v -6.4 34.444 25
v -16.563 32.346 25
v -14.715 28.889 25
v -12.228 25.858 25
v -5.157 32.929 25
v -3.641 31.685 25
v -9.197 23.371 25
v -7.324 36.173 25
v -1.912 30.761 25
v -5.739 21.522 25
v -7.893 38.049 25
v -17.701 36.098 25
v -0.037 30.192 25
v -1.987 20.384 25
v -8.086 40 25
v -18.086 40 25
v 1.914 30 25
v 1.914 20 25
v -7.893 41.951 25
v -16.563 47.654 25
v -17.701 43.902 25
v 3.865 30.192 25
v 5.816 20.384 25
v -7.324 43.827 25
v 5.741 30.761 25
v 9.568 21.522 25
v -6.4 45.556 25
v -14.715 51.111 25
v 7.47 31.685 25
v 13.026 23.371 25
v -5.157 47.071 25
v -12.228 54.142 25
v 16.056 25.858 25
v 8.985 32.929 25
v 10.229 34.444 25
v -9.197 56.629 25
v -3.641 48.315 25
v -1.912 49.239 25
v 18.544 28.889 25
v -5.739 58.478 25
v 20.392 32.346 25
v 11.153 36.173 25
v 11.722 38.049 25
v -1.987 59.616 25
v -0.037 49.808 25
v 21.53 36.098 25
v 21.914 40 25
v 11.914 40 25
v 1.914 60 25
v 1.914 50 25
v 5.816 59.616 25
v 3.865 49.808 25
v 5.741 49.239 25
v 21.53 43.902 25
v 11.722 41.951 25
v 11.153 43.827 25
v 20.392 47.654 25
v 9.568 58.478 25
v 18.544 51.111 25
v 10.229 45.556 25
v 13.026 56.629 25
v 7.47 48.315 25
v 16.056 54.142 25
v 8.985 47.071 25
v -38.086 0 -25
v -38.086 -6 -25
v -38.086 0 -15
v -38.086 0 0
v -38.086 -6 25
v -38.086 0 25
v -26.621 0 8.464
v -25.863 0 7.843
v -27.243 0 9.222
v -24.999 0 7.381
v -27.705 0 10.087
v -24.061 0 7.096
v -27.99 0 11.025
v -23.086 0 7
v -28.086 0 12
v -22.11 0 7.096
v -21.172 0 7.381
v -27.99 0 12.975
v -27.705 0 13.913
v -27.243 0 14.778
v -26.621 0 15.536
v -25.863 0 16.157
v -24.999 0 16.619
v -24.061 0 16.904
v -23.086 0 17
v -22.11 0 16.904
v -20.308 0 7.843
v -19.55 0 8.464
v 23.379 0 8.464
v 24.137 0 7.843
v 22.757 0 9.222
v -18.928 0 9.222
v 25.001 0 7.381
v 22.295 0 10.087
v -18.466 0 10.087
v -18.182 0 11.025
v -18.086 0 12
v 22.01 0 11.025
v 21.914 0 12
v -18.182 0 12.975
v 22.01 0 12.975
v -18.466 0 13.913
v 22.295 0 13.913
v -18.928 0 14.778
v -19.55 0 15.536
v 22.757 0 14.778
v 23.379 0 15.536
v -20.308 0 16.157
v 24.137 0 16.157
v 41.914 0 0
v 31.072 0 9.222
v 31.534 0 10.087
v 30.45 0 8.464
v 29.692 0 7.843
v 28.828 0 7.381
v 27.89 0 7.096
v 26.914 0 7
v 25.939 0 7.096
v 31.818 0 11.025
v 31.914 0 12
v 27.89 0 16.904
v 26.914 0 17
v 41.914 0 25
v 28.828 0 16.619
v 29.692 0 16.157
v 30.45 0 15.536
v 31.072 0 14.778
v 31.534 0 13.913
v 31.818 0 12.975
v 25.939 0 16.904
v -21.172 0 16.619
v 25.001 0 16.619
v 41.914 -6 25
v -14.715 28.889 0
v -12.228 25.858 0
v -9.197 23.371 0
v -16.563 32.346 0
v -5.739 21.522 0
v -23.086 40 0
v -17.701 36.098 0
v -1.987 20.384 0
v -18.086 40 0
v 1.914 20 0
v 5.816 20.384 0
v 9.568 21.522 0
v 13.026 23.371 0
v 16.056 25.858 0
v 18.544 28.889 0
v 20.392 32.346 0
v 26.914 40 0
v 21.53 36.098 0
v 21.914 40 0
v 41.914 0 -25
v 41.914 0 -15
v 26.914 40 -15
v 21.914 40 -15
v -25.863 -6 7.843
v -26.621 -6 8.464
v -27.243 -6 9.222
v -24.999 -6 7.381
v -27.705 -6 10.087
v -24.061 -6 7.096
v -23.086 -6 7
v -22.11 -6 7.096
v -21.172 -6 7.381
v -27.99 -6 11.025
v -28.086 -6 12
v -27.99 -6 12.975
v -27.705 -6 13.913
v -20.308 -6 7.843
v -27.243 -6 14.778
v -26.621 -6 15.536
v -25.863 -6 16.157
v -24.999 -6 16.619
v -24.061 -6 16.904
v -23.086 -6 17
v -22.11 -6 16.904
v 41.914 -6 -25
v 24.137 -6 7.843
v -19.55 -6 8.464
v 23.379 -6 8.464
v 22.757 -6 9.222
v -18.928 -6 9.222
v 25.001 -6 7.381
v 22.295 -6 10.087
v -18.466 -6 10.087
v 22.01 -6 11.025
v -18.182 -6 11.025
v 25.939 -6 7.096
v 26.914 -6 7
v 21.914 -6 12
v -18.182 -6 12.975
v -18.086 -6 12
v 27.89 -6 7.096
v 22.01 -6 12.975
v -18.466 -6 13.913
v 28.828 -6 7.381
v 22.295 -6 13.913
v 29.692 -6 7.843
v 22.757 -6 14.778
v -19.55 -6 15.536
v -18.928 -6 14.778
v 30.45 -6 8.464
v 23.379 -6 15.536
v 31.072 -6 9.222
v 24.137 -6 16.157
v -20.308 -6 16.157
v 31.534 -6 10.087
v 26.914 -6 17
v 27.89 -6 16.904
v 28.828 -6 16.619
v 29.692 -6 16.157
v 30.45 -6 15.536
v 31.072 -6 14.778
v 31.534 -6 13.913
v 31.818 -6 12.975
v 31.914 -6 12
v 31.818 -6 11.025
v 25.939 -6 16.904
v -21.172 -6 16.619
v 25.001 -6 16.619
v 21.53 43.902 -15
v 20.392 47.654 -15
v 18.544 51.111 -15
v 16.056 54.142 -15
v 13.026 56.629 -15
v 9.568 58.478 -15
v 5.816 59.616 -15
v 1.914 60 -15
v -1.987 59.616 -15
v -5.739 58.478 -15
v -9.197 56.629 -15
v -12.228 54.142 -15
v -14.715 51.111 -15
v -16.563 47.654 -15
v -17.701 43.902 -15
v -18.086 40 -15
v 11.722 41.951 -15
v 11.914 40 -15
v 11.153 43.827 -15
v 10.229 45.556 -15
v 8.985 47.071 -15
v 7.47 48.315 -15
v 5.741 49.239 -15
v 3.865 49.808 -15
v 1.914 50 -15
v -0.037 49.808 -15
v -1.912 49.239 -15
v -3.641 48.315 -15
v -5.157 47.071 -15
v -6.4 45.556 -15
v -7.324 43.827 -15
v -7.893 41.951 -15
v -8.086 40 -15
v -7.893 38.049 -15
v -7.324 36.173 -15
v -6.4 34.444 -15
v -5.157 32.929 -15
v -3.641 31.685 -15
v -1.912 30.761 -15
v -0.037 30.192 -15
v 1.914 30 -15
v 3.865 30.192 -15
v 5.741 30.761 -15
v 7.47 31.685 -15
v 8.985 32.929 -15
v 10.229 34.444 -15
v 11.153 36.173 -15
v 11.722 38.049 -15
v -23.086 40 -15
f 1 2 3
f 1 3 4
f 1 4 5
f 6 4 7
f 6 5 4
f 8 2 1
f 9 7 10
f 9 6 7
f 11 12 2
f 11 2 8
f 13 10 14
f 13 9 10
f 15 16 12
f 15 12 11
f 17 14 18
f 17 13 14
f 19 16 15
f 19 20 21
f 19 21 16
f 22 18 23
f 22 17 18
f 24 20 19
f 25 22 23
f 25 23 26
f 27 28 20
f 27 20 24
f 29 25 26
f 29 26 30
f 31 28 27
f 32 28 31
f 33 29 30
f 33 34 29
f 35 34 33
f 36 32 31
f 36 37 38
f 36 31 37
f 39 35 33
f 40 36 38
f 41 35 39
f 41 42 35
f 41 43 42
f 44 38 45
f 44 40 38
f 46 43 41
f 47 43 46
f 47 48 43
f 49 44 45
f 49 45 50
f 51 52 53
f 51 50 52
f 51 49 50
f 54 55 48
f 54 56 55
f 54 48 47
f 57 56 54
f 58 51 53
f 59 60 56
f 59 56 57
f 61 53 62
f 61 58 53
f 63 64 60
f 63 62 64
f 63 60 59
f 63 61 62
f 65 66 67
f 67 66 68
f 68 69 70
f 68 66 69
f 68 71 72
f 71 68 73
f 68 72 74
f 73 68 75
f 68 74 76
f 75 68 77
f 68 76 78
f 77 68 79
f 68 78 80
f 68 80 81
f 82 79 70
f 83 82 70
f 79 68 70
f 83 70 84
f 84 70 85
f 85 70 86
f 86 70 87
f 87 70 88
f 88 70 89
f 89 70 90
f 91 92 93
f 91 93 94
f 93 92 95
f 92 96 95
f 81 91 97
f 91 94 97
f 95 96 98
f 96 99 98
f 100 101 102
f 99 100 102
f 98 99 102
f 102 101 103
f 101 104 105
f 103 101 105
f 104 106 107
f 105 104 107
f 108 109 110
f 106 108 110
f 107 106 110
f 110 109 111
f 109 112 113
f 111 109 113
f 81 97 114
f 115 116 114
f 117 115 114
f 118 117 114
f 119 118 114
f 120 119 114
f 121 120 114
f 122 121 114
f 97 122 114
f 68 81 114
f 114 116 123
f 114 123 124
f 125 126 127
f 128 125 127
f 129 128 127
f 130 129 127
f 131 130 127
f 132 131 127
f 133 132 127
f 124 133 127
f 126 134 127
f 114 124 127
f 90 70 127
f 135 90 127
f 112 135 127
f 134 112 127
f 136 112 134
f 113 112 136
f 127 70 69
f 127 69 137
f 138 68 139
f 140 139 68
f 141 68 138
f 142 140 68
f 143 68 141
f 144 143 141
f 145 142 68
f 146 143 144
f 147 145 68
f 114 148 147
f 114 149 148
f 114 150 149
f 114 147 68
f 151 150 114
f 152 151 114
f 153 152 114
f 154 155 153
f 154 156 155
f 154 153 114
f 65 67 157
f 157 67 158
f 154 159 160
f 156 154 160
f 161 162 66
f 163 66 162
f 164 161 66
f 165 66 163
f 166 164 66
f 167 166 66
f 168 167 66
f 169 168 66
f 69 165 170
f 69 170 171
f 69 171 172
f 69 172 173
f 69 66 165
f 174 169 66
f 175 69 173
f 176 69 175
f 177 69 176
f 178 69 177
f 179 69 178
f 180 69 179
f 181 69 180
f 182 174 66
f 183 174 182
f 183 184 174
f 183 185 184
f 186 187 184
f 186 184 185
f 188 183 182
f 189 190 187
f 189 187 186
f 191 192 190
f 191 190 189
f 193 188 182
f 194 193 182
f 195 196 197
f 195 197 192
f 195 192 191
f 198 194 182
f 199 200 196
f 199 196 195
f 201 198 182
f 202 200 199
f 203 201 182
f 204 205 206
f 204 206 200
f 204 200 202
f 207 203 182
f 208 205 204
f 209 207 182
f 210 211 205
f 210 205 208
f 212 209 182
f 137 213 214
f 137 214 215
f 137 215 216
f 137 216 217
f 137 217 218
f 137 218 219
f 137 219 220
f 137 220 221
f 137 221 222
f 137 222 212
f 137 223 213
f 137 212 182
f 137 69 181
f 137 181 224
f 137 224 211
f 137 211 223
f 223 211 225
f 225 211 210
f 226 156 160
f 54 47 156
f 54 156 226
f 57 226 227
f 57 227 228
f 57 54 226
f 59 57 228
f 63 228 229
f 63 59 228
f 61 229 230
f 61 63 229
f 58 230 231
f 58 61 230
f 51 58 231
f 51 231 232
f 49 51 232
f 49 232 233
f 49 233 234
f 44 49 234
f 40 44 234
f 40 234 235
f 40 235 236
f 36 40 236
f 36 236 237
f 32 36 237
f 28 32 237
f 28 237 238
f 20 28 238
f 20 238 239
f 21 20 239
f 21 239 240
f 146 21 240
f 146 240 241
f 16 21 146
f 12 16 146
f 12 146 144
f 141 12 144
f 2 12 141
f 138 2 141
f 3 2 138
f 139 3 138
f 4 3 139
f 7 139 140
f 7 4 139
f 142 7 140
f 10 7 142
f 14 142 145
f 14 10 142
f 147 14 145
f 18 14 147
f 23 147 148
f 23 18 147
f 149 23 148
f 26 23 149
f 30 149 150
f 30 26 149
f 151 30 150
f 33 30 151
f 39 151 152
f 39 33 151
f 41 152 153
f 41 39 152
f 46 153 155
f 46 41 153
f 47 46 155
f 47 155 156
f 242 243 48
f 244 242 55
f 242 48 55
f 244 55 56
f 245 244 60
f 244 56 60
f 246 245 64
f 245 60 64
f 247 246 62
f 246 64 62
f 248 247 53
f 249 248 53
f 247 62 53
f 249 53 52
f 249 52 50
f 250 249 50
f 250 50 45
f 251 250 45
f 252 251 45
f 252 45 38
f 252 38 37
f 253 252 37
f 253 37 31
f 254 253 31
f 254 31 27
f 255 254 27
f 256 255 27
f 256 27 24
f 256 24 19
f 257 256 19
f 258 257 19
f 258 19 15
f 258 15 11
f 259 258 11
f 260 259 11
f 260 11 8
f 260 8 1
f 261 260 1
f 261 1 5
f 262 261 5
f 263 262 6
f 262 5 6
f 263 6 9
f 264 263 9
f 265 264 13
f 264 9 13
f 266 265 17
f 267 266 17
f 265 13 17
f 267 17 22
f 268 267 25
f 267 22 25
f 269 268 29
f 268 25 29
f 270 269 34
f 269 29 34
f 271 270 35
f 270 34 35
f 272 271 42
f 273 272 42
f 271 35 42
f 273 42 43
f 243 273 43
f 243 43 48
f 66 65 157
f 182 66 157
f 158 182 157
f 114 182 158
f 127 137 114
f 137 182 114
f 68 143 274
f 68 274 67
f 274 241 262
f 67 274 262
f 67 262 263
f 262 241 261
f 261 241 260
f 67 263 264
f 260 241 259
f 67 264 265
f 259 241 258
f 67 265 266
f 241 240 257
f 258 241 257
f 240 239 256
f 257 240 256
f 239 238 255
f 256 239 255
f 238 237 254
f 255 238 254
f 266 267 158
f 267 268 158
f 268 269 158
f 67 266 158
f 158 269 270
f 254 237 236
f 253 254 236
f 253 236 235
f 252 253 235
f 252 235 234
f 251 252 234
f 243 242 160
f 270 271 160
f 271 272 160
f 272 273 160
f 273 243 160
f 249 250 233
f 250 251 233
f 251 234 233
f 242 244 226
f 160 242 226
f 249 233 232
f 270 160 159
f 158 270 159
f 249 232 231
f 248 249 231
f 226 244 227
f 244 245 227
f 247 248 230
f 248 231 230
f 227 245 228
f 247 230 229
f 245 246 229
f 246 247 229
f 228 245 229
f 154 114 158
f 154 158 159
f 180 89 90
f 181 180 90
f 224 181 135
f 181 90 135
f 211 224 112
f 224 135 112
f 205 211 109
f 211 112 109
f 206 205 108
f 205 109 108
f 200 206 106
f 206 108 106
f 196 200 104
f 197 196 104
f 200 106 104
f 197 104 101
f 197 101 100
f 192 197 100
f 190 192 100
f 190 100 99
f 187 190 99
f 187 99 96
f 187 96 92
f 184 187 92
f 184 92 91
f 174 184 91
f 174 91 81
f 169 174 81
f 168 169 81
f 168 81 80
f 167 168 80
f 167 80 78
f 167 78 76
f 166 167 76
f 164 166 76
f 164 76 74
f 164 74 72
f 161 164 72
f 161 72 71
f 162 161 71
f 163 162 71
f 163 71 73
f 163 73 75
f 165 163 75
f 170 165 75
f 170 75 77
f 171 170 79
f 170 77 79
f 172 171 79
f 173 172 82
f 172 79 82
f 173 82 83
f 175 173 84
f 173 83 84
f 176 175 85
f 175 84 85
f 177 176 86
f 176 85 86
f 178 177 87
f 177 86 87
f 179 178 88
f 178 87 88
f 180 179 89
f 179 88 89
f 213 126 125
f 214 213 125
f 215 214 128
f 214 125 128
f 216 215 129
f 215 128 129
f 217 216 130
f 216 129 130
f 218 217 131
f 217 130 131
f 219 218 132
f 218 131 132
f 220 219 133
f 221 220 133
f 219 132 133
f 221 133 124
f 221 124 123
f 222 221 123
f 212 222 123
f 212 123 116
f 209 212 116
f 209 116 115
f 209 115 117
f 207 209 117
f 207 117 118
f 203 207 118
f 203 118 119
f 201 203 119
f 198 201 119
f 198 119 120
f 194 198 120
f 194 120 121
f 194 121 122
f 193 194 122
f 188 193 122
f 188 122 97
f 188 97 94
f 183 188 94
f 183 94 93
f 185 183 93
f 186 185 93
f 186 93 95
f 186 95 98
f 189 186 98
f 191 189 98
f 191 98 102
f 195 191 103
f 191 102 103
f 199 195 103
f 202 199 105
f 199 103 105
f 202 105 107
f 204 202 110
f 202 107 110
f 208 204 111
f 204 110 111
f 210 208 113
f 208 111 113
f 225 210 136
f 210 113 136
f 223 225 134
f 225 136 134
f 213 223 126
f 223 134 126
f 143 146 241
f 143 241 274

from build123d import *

# Parameters (mm, degrees)
SKETCH1_W           = 80
SKETCH1_H           = 6
BOSS_EXTRUDE1_DEPTH = 50
SKETCH6_R           = 20
BOSS_EXTRUDE2_DEPTH = 15
BOSS_EXTRUDE3_START = 25
SKETCH7_R           = 20
BOSS_EXTRUDE3_DEPTH = 25
CUT_EXTRUDE1_REACH  = 90.639
SKETCH8_R           = 10
CUT_EXTRUDE2_REACH  = 79.342
SKETCH9_R           = 5


with BuildPart() as part:
    # Sketch1 → Boss-Extrude1 (new body)
    with BuildSketch(Plane.XY):
        with Locations((1.914357683, -3)):
            Rectangle(SKETCH1_W, SKETCH1_H)
    extrude(amount=-BOSS_EXTRUDE1_DEPTH)


with BuildPart() as part_1:
    # Body-Move/Copy2: moved
    add(part.part.moved(Location((0, 0, 25))))

    # Sketch6 → Boss-Extrude2 (add)
    with BuildSketch(Plane.XY):
        with BuildLine():
            Line((-38.085642317, 0), (41.914357683, 0))
            Line((41.914357683, 0), (26.914357683, 40))
            Line((26.914357683, 40), (21.914357683, 40))
            ThreePointArc((21.914357683, 40), (1.914357683, 20), (-18.085642317, 40))
            Line((-18.085642317, 40), (-23.085642317, 40))
            Line((-23.085642317, 40), (-38.085642317, 0))
        make_face()
        with Locations((1.914357683, 40)):
            Circle(SKETCH6_R)
    extrude(amount=-BOSS_EXTRUDE2_DEPTH)

    # Sketch7 → Boss-Extrude3 (add)
    with BuildSketch(Plane.XY.offset(BOSS_EXTRUDE3_START)):
        with Locations((1.914357683, 40)):
            Circle(SKETCH7_R)
    extrude(amount=-BOSS_EXTRUDE3_DEPTH)

    # Sketch8 → Cut-Extrude1 (cut, up to next)
    with BuildSketch(Plane.XY.offset(25), mode=Mode.PRIVATE) as cut_extrude1_sk1:
        with Locations((1.914357683, 40)):
            Circle(SKETCH8_R)
    cut_extrude1_tool1 = extrude(cut_extrude1_sk1.sketch, amount=-CUT_EXTRUDE1_REACH, mode=Mode.PRIVATE) & part_1.part
    add(cut_extrude1_tool1.solids().sort_by_distance((1.914358, 40, 25))[0], mode=Mode.SUBTRACT)

    # Sketch9 → Cut-Extrude2 (cut, up to next)
    with BuildSketch(Plane(origin=(0, 0, 0), x_dir=(1, 0, 0), z_dir=(0, 1, 0)), mode=Mode.PRIVATE) as cut_extrude2_sk1:
        with Locations(Location((26.914357683, -12, 0), (0, 0, 270))):
            Circle(SKETCH9_R)
    cut_extrude2_tool1 = extrude(cut_extrude2_sk1.sketch, amount=-CUT_EXTRUDE2_REACH, mode=Mode.PRIVATE) & part_1.part
    # Sketch9 → Cut-Extrude2 (cut, up to next)
    with BuildSketch(Plane(origin=(0, 0, 0), x_dir=(1, 0, 0), z_dir=(0, 1, 0)), mode=Mode.PRIVATE) as cut_extrude2_sk2:
        with Locations(Location((-23.085642317, -12, 0), (0, 0, 270))):
            Circle(SKETCH9_R)
    cut_extrude2_tool2 = extrude(cut_extrude2_sk2.sketch, amount=-CUT_EXTRUDE2_REACH, mode=Mode.PRIVATE) & part_1.part
    add(cut_extrude2_tool1.solids().sort_by_distance((26.914358, 0, 12))[0], mode=Mode.SUBTRACT)
    add(cut_extrude2_tool2.solids().sort_by_distance((-23.085642, 0, 12))[0], mode=Mode.SUBTRACT)


solid = part_1.part
